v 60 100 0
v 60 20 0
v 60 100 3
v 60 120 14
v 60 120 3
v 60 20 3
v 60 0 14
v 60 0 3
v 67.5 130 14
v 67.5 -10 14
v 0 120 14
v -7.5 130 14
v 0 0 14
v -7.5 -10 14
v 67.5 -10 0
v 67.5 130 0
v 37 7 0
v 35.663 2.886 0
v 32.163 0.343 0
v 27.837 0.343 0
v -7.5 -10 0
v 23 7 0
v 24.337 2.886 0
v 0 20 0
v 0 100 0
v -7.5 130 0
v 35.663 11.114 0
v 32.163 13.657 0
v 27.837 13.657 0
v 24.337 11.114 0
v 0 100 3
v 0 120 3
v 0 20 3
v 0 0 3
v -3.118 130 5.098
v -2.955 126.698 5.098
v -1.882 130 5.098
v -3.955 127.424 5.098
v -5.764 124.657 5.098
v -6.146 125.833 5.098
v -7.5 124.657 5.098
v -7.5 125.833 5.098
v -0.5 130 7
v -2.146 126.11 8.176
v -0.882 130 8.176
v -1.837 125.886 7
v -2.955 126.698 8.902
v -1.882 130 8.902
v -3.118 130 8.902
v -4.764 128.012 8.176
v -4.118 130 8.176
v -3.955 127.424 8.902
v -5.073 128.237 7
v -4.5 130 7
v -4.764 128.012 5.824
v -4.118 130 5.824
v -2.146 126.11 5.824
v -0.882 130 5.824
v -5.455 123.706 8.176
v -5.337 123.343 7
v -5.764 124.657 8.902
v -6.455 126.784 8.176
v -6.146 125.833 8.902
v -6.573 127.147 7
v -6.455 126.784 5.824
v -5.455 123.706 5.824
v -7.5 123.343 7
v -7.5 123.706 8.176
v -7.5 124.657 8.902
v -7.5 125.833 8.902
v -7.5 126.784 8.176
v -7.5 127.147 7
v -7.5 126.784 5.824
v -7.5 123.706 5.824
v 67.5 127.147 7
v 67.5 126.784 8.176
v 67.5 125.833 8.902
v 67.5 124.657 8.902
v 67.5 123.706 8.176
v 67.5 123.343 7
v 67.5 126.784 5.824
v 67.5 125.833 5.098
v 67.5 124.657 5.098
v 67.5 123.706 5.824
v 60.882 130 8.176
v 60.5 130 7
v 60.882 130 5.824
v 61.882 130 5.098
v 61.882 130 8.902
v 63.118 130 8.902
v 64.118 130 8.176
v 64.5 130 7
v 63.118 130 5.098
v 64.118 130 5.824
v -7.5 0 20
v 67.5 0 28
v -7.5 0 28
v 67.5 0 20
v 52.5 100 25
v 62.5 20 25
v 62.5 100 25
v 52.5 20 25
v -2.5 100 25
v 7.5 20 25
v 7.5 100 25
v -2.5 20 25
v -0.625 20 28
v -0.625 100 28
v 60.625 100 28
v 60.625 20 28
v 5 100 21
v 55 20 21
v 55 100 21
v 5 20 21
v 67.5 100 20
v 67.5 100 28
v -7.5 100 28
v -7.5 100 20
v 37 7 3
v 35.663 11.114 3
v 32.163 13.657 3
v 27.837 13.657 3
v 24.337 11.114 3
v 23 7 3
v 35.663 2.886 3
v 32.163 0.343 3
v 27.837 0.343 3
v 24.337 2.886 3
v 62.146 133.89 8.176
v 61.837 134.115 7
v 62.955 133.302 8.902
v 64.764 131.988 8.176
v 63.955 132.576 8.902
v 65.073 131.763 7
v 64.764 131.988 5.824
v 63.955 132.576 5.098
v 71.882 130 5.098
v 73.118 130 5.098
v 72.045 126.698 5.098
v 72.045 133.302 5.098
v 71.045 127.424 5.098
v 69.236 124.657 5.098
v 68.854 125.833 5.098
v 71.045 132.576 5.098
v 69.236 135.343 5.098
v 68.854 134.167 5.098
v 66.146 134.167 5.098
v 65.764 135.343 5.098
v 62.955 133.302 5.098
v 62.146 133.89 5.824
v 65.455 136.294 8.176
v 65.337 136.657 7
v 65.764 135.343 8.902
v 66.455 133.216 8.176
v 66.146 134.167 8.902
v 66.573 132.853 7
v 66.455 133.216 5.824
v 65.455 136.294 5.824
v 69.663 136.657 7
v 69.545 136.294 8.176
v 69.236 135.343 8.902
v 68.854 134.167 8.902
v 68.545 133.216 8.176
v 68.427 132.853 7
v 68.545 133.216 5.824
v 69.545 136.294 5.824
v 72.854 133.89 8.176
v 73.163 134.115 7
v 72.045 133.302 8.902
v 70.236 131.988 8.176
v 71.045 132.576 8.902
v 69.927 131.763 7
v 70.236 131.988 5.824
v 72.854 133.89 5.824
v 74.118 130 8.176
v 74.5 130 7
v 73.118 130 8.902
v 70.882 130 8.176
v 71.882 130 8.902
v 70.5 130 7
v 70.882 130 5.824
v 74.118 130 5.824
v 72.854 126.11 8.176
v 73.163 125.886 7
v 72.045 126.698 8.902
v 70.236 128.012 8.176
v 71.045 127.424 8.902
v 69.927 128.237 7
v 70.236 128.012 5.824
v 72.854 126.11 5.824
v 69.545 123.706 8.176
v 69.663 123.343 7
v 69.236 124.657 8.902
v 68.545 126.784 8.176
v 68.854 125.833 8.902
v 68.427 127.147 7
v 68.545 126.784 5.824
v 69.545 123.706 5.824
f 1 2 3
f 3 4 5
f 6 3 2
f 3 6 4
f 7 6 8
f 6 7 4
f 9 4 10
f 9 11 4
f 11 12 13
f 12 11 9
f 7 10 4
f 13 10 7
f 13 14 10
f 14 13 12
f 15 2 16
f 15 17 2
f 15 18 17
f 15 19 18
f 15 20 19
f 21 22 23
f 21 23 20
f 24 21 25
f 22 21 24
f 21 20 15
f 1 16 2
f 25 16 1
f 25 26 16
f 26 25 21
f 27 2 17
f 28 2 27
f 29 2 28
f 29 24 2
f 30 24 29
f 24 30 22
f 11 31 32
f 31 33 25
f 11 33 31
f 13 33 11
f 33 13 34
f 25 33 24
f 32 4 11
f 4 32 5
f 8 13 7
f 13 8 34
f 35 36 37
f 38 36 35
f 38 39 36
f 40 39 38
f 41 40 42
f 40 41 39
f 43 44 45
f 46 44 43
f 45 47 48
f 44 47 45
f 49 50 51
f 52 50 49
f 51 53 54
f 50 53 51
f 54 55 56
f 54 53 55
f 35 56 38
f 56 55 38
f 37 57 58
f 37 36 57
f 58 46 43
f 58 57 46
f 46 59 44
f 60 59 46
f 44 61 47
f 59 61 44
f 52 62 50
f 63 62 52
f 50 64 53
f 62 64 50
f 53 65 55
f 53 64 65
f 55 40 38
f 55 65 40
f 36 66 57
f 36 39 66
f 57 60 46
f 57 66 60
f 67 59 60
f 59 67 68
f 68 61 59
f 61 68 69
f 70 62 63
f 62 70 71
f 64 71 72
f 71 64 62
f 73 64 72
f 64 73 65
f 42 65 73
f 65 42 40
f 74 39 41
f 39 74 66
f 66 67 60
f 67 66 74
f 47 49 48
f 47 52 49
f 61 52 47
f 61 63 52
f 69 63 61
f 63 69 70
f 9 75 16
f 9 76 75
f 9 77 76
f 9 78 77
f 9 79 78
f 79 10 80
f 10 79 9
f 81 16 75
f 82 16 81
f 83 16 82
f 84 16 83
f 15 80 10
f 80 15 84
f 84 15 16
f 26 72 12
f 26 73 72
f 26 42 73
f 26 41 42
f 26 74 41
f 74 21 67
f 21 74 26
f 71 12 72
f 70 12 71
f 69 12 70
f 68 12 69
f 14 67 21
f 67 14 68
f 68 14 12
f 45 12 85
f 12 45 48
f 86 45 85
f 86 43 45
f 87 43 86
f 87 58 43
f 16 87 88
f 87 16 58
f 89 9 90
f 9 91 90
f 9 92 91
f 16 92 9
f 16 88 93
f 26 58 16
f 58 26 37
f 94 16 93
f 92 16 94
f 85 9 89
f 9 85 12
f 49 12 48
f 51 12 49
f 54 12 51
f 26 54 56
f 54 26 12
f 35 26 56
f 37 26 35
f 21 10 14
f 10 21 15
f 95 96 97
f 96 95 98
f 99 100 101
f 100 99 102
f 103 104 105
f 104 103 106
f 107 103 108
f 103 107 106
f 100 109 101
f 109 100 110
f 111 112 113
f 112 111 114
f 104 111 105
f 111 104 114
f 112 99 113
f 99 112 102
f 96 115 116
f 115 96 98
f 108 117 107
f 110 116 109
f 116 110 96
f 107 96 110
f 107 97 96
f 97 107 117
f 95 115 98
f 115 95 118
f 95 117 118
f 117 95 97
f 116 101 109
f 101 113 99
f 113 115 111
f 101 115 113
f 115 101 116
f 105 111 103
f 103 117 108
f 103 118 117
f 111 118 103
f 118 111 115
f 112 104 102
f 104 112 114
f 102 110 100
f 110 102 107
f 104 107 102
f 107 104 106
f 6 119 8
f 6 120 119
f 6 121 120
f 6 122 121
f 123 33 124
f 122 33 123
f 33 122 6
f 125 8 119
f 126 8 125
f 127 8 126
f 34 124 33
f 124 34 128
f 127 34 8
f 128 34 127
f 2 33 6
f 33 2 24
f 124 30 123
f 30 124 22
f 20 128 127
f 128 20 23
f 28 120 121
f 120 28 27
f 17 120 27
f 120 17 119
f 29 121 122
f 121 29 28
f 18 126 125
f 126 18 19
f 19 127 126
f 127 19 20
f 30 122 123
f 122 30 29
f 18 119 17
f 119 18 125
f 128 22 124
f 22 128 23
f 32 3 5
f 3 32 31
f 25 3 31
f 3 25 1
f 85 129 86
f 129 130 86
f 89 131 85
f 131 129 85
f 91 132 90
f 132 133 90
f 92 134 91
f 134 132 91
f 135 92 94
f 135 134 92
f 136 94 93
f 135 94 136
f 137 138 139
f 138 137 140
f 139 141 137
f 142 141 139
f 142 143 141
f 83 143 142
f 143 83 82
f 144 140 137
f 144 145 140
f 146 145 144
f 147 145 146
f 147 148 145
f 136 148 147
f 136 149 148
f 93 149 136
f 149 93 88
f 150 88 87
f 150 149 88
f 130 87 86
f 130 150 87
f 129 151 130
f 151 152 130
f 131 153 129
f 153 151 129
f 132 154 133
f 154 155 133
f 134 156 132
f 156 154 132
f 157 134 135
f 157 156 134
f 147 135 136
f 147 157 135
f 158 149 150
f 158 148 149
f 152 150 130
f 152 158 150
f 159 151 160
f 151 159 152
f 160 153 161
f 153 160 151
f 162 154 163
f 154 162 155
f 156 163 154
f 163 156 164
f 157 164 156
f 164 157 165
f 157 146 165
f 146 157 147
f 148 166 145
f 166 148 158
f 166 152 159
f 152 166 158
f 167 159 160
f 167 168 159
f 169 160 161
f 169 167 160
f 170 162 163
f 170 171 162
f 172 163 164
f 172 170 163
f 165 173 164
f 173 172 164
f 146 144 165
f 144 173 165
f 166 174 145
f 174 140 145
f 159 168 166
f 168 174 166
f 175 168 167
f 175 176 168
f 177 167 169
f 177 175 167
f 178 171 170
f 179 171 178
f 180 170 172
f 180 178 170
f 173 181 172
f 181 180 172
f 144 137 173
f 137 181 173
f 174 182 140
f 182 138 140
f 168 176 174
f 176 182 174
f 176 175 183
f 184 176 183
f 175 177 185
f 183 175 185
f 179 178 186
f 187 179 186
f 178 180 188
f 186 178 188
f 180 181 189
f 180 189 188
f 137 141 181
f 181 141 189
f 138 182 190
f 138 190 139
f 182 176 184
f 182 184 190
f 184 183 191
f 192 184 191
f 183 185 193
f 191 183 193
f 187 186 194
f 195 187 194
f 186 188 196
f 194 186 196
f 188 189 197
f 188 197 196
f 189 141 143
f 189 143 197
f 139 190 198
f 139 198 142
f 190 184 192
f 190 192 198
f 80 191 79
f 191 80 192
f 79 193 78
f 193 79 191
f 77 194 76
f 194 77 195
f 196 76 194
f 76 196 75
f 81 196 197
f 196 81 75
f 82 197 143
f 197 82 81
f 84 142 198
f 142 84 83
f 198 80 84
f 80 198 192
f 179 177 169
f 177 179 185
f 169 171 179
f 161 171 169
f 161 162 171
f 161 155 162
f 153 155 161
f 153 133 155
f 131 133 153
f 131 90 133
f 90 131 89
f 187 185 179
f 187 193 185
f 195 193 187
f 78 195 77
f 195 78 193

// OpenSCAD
// ---------Definitions----------

module mainBo() {  //Main Body

difference() {

	translate([-7.5,-10,0]) {
	cube([75,140,14], center=false); //case
	}

	union() {
		cube([60,120,14], center=false); 
		eyeletIn(); 
	} 

}}


module eyeletEx() {  //Eyelet, External

translate([67.5,130,7]) {
rotate_extrude(convexity = 10, $fn=10)
	translate([5,0,0])
		circle(r=2, $fn=10); 

}}


module eyeletIn() { //Eyelet, Internal

translate([-7.5,130,7]) {
rotate_extrude(convexity = 10, $fn=10)
	translate([5,0,0]) 
		circle(r=2, $fn=10); 

}}


module cardGr() {   //CardGroove, ***In progress***
translate([-7.5,0,20]) {
	cube([75,20,8]);
	difference() {
		cube([75,100,8]);
		translate([7.5,0,9]) {
			rotate([270,0,0]) {
				grooveCu(110,65,60,4);
				translate([7.5,4,0]) {
					grooveCu(110,50,45,4);
				}
			}
		}
	}
}}



module grooveCu(h,widthFront,widthBack,c) { //groove cutter

//Variables, assuming origin at 0,0,0

//h = height
//widthFront = 65; width front
//widthBack = 60; width back
//c = 5; thickness

bevel = (widthBack - widthFront) / 2; //bevel cut width
x1 = bevel;
x2 = widthBack - bevel;

polyhedron(points = [[0,0,0],[x1,c,0],[x2,c,0],[widthBack,0,0],[0,0,h],[x1,c,h],[x2,c,h],[widthBack,0,h]], 

triangles = 
[[0,3,2],[0,2,1],
[7,4,6],[6,4,5],
[1,2,5],[2,6,5],
[3,0,4],[7,3,4],
[0,1,4],[1,5,4],
[2,3,6],[3,7,6]],
convexity = 10);


}



module overCo() {  //Over-Covers


translate([-7.5,100,0]) { //top
cube([75,20,3]);
}

translate([-5,0,0]) { //bottom
	difference() {
		cube([65,20,3]);
	
		translate([35,7,2]) {
			cylinder(h=5, r=7,center=true, $fn=10);
		}
	}
}}



// ~ ~ ~ ~ ~ ~ ~ MASTER GENERATION CODE!!! ~ ~ ~ ~ ~~ ~ ~ 

//main body
mainBo();

//external eyelet
eyeletEx();

// card groove
cardGr();

//over-covers
overCo();




//Notes
//We need an easy way to do subtractive booleans, because it's a bitch to make these cuts via nesting. Is it having a section for add and subtract, splitting it into functions, or perhaps having an invert so you can "add" a negative. No idea...
